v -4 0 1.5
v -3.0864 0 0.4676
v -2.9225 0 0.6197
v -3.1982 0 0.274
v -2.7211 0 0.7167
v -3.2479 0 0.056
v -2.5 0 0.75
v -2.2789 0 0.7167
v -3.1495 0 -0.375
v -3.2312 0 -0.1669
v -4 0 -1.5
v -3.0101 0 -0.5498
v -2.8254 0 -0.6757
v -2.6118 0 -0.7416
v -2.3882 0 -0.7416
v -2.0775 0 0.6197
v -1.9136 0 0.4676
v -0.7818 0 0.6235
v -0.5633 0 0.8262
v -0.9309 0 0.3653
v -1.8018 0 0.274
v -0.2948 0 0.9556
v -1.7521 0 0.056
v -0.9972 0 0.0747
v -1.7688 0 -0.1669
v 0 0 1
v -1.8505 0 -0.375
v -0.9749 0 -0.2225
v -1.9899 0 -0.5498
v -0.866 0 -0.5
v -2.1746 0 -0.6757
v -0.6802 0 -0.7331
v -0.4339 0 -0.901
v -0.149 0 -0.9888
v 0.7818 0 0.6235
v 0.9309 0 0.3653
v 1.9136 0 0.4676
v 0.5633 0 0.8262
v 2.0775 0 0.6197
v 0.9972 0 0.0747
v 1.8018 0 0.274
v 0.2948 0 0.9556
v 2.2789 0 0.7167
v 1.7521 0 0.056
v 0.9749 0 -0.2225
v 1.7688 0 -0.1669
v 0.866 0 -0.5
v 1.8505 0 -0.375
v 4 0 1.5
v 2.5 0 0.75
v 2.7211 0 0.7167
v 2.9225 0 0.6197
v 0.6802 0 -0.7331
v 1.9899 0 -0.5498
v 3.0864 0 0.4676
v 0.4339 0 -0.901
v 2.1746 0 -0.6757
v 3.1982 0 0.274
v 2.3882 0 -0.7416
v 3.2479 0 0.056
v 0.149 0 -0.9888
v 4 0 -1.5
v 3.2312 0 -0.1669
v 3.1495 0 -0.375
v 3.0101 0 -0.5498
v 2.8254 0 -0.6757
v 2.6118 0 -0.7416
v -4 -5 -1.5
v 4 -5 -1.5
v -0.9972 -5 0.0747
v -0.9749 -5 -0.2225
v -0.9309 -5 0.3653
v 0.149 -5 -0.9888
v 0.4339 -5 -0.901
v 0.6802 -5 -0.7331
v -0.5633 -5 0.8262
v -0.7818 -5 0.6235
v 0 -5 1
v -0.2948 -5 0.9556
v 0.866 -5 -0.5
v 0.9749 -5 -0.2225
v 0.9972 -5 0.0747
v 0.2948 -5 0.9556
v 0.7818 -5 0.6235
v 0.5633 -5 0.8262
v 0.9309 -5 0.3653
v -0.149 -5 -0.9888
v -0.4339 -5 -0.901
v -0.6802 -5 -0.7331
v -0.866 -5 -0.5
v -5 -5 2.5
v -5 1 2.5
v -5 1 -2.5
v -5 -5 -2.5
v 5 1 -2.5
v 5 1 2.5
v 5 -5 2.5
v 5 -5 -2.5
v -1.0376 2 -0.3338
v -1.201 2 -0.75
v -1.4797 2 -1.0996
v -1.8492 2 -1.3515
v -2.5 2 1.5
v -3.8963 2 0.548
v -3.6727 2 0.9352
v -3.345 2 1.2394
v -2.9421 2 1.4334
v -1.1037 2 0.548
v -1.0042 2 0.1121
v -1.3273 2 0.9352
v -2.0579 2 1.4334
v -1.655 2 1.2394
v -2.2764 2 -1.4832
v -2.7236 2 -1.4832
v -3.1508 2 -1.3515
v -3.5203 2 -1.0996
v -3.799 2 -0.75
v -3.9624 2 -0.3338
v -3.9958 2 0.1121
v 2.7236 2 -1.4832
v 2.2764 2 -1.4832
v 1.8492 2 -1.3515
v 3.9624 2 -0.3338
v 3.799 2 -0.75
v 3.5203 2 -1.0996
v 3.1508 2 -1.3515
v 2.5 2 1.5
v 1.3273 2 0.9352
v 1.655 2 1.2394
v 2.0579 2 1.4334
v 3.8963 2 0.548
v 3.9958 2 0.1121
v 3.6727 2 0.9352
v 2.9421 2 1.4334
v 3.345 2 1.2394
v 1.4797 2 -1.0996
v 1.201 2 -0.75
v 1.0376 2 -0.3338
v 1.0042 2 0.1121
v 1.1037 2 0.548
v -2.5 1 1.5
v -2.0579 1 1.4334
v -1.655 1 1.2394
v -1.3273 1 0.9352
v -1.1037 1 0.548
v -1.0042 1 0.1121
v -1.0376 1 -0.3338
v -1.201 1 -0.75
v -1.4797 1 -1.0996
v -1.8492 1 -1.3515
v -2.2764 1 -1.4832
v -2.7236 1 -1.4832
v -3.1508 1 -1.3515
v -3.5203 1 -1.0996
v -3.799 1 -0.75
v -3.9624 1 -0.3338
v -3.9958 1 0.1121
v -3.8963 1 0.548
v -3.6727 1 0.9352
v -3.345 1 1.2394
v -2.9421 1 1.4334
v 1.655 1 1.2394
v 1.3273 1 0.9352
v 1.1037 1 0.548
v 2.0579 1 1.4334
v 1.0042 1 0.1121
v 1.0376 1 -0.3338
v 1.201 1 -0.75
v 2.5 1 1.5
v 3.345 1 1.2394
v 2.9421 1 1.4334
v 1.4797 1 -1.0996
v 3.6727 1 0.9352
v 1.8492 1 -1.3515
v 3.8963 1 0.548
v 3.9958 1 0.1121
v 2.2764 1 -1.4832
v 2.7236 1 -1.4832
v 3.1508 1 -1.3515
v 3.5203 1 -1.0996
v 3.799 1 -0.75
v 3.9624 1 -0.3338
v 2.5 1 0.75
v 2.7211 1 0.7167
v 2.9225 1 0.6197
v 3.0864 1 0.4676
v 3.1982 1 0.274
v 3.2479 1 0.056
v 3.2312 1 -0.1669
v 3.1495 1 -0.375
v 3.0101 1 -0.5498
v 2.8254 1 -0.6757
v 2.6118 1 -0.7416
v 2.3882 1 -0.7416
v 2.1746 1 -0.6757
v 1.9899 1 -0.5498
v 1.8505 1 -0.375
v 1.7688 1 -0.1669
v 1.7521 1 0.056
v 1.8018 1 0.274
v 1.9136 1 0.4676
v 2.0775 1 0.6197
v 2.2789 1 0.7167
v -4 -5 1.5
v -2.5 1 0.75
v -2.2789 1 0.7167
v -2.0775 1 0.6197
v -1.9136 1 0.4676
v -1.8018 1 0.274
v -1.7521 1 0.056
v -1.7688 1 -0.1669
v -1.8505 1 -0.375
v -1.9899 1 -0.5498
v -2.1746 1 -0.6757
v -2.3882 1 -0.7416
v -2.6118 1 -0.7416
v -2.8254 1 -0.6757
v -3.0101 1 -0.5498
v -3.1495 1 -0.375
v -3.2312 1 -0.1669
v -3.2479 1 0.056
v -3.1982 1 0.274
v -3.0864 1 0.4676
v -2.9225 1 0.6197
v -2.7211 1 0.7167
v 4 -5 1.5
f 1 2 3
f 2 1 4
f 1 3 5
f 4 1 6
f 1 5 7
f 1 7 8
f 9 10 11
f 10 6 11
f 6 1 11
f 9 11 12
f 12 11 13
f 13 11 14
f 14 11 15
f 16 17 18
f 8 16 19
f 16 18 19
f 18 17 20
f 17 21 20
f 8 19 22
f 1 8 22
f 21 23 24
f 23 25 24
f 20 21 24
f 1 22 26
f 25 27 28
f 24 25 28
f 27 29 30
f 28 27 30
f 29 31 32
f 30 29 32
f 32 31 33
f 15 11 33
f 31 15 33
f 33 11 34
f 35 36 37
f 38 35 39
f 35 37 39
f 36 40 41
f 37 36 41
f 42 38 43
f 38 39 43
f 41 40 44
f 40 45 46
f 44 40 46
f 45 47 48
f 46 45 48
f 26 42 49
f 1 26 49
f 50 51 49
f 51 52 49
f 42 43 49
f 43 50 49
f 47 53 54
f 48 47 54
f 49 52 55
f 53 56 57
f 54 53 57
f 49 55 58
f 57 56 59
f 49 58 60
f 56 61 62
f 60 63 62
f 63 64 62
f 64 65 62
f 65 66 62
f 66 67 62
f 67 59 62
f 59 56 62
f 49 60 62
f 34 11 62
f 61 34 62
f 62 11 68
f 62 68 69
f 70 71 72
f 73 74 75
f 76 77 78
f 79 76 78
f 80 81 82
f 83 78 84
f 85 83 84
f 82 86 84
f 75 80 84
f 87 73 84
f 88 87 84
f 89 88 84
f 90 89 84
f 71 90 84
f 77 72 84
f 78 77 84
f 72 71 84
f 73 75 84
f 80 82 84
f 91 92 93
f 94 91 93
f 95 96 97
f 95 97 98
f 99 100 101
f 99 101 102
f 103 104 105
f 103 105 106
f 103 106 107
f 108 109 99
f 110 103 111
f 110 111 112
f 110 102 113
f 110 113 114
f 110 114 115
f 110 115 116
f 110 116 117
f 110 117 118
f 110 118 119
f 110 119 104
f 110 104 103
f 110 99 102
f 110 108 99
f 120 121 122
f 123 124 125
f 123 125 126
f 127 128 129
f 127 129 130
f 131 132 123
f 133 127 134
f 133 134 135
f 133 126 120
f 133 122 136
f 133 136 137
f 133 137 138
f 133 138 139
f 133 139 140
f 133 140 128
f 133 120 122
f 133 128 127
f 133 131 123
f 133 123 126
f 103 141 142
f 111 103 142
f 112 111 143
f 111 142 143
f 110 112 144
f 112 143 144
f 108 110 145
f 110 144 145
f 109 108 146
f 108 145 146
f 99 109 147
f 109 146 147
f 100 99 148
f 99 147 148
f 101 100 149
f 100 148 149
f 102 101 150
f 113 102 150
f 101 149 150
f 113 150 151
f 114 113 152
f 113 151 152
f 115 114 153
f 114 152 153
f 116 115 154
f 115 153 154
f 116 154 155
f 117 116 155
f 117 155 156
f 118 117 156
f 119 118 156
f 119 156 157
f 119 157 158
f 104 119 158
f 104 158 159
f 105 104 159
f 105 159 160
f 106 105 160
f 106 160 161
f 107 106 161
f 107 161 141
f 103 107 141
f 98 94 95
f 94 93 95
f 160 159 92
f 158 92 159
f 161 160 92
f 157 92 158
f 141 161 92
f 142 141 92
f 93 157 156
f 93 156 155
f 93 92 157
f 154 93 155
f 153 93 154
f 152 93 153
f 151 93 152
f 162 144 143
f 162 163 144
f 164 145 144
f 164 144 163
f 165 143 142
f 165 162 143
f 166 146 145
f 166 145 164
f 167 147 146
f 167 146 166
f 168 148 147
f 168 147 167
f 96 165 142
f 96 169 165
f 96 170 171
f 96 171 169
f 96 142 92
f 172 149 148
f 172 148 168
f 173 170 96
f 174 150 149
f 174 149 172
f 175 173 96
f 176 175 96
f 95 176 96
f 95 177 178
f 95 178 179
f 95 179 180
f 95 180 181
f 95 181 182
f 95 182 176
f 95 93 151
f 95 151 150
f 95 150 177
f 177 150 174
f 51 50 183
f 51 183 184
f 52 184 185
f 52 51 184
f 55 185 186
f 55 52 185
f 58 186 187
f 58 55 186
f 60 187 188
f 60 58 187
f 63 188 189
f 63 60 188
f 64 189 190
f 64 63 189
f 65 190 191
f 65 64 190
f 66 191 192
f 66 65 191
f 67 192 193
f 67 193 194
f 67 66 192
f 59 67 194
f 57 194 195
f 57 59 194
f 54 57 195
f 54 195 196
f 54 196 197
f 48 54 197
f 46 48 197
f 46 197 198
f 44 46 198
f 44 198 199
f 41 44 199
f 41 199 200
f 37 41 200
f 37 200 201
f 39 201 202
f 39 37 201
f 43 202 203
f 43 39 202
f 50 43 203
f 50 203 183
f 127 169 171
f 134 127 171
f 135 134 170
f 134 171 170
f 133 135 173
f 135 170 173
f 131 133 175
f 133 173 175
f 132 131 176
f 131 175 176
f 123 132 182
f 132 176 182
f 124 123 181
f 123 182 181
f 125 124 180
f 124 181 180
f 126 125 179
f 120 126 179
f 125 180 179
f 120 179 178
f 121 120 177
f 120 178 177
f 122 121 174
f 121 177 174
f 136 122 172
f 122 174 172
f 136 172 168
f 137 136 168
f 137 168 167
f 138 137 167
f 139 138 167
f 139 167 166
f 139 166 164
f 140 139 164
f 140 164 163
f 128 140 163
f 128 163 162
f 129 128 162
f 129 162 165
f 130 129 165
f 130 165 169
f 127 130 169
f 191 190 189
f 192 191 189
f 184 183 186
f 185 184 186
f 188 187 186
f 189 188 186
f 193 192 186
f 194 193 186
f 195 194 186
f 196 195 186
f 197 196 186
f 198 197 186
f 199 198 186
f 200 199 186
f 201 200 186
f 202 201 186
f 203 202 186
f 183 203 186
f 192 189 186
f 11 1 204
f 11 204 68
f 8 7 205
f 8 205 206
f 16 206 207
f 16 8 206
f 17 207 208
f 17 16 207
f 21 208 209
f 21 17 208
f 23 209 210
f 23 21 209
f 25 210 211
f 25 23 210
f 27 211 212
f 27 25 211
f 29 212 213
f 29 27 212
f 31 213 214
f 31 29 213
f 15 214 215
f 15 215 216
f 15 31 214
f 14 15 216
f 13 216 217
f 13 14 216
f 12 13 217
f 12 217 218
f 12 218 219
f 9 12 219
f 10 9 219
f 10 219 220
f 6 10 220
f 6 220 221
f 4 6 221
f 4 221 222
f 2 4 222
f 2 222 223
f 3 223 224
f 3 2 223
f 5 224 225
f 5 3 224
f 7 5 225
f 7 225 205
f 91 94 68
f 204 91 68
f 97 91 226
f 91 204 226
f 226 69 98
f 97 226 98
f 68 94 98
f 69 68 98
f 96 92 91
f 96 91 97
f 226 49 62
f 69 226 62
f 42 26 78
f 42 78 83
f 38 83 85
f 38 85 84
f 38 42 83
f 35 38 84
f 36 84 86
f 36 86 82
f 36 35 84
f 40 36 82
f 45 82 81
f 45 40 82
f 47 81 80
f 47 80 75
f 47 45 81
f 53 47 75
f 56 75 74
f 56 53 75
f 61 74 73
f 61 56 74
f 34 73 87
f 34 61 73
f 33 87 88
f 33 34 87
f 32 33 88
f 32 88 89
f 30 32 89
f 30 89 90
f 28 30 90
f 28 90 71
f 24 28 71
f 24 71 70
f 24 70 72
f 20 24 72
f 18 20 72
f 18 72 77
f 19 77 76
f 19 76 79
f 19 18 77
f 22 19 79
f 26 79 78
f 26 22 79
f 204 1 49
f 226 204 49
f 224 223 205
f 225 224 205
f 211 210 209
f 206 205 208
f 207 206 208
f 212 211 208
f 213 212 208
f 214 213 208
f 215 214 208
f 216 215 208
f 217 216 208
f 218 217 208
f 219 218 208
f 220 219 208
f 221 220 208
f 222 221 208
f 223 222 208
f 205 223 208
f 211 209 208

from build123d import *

# Parameters (mm, degrees)
SKETCH1_R             = 1.5
BOSS_EXTRUDE1_DEPTH   = 2
BOSS_EXTRUDE1_2_DEPTH = 2
SKETCH1_3_W           = 10
SKETCH1_3_H           = 5
BOSS_EXTRUDE2_DEPTH   = 1
SKETCH1_4_R           = 0.75
CUT_EXTRUDE1_DEPTH    = 1
SKETCH1_5_W           = 10
SKETCH1_5_H           = 5
SKETCH1_5_W_2         = 8
SKETCH1_5_H_2         = 3
SKETCH1_5_R           = 1
BOSS_EXTRUDE3_DEPTH   = 5


with BuildPart() as part:
    # Sketch1 → Boss-Extrude1 (new body)
    with BuildSketch(Plane(origin=(0, 0, 0), x_dir=(1, 0, 0), z_dir=(0, 1, 0))):
        with Locations((-2.5, 0)):
            Circle(SKETCH1_R)
    extrude(amount=BOSS_EXTRUDE1_DEPTH)



with BuildPart() as body_2:
    # Sketch1 → Boss-Extrude1 2 (new body)
    with BuildSketch(Plane(origin=(0, 0, 0), x_dir=(1, 0, 0), z_dir=(0, 1, 0))):
        with Locations((2.5, 0)):
            Circle(SKETCH1_R)
    extrude(amount=BOSS_EXTRUDE1_2_DEPTH)


with BuildPart() as part_1:
    add(part.part)

    add(body_2.part)  # Boss-Extrude2 merges body 2
    # Sketch1<3> → Boss-Extrude2 (add)
    with BuildSketch(Plane(origin=(0, 0, 0), x_dir=(1, 0, 0), z_dir=(0, 1, 0))):
        Rectangle(SKETCH1_3_W, SKETCH1_3_H)
    extrude(amount=BOSS_EXTRUDE2_DEPTH)

    # Sketch1<4> → Cut-Extrude1 (cut)
    with BuildSketch(Plane(origin=(0, 0, 0), x_dir=(1, 0, 0), z_dir=(0, 1, 0))):
        with Locations((-2.5, 0)):
            Circle(SKETCH1_4_R)
        with Locations((2.5, 0)):
            Circle(SKETCH1_4_R)
    extrude(amount=CUT_EXTRUDE1_DEPTH, mode=Mode.SUBTRACT)

    # Sketch1<5> → Boss-Extrude3 (add)
    # profile 1 of 2: a face of its own
    with BuildSketch(Plane(origin=(0, 0, 0), x_dir=(1, 0, 0), z_dir=(0, 1, 0))):
        Rectangle(SKETCH1_5_W, SKETCH1_5_H)
        Rectangle(SKETCH1_5_W_2, SKETCH1_5_H_2, mode=Mode.SUBTRACT)
    # profile 2 of 2: a face of its own
    with BuildSketch(Plane(origin=(0, 0, 0), x_dir=(1, 0, 0), z_dir=(0, 1, 0))):
        Circle(SKETCH1_5_R)
    extrude(amount=-BOSS_EXTRUDE3_DEPTH)


solid = part_1.part
